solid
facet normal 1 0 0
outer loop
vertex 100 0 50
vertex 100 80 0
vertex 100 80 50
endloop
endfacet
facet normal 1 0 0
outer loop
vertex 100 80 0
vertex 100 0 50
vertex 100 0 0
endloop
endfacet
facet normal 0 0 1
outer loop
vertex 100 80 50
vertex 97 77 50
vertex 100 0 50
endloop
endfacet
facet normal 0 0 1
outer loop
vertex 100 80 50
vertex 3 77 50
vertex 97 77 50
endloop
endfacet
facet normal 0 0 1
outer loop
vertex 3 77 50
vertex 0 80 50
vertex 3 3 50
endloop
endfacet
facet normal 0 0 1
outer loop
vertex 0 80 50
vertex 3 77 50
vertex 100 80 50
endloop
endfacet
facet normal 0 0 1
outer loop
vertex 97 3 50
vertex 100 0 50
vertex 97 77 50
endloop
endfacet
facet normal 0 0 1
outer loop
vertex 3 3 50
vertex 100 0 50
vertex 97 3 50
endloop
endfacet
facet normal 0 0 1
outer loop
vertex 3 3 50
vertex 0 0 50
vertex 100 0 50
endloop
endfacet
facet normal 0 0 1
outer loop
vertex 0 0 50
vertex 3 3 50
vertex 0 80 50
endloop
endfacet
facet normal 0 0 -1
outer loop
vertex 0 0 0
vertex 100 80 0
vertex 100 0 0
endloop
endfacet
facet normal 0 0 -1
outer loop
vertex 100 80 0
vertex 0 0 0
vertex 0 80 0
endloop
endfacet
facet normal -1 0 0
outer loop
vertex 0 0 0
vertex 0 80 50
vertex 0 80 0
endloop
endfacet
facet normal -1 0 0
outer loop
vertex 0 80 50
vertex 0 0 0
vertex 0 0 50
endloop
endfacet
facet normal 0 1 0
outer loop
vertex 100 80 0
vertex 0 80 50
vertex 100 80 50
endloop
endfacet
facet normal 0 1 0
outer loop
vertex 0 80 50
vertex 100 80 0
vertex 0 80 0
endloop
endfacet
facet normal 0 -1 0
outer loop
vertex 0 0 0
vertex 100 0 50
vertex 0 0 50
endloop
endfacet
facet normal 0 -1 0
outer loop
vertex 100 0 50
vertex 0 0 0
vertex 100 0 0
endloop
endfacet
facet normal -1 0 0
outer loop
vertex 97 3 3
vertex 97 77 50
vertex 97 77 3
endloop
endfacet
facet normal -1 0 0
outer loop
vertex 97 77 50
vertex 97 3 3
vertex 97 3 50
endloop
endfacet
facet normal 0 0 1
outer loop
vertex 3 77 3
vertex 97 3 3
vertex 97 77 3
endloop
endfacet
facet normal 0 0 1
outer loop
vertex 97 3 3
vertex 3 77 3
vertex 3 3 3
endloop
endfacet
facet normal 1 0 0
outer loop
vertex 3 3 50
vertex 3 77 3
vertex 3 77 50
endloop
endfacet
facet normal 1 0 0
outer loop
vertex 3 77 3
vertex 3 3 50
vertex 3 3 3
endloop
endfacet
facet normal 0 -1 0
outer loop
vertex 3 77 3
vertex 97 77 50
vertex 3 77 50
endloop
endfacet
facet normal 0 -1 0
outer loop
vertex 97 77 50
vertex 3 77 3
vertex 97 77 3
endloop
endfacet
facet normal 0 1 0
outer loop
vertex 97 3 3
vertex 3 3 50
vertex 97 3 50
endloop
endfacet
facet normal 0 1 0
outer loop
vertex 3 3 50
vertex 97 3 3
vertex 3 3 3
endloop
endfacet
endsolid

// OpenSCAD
// Enkel låda med botten

/* Låda */
box_width = 100;        // [50:1:200]
box_depth = 80;         // [50:1:150]
box_height = 50;        // [20:1:100]
wall_thickness = 3;     // [1:0.5:8]
bottom_thickness = 3;   // [1:0.5:8]
box_color = "Wheat";

module simple_box() {
    color(box_color)
    difference() {
        // Ytterform
        cube([box_width, box_depth, box_height], center = false);

        // Håla ut insidan (lämnar botten och väggar)
        translate([wall_thickness, wall_thickness, bottom_thickness])
            cube([
                box_width - 2 * wall_thickness,
                box_depth - 2 * wall_thickness,
                box_height - bottom_thickness
            ], center = false);
    }
}

simple_box();
